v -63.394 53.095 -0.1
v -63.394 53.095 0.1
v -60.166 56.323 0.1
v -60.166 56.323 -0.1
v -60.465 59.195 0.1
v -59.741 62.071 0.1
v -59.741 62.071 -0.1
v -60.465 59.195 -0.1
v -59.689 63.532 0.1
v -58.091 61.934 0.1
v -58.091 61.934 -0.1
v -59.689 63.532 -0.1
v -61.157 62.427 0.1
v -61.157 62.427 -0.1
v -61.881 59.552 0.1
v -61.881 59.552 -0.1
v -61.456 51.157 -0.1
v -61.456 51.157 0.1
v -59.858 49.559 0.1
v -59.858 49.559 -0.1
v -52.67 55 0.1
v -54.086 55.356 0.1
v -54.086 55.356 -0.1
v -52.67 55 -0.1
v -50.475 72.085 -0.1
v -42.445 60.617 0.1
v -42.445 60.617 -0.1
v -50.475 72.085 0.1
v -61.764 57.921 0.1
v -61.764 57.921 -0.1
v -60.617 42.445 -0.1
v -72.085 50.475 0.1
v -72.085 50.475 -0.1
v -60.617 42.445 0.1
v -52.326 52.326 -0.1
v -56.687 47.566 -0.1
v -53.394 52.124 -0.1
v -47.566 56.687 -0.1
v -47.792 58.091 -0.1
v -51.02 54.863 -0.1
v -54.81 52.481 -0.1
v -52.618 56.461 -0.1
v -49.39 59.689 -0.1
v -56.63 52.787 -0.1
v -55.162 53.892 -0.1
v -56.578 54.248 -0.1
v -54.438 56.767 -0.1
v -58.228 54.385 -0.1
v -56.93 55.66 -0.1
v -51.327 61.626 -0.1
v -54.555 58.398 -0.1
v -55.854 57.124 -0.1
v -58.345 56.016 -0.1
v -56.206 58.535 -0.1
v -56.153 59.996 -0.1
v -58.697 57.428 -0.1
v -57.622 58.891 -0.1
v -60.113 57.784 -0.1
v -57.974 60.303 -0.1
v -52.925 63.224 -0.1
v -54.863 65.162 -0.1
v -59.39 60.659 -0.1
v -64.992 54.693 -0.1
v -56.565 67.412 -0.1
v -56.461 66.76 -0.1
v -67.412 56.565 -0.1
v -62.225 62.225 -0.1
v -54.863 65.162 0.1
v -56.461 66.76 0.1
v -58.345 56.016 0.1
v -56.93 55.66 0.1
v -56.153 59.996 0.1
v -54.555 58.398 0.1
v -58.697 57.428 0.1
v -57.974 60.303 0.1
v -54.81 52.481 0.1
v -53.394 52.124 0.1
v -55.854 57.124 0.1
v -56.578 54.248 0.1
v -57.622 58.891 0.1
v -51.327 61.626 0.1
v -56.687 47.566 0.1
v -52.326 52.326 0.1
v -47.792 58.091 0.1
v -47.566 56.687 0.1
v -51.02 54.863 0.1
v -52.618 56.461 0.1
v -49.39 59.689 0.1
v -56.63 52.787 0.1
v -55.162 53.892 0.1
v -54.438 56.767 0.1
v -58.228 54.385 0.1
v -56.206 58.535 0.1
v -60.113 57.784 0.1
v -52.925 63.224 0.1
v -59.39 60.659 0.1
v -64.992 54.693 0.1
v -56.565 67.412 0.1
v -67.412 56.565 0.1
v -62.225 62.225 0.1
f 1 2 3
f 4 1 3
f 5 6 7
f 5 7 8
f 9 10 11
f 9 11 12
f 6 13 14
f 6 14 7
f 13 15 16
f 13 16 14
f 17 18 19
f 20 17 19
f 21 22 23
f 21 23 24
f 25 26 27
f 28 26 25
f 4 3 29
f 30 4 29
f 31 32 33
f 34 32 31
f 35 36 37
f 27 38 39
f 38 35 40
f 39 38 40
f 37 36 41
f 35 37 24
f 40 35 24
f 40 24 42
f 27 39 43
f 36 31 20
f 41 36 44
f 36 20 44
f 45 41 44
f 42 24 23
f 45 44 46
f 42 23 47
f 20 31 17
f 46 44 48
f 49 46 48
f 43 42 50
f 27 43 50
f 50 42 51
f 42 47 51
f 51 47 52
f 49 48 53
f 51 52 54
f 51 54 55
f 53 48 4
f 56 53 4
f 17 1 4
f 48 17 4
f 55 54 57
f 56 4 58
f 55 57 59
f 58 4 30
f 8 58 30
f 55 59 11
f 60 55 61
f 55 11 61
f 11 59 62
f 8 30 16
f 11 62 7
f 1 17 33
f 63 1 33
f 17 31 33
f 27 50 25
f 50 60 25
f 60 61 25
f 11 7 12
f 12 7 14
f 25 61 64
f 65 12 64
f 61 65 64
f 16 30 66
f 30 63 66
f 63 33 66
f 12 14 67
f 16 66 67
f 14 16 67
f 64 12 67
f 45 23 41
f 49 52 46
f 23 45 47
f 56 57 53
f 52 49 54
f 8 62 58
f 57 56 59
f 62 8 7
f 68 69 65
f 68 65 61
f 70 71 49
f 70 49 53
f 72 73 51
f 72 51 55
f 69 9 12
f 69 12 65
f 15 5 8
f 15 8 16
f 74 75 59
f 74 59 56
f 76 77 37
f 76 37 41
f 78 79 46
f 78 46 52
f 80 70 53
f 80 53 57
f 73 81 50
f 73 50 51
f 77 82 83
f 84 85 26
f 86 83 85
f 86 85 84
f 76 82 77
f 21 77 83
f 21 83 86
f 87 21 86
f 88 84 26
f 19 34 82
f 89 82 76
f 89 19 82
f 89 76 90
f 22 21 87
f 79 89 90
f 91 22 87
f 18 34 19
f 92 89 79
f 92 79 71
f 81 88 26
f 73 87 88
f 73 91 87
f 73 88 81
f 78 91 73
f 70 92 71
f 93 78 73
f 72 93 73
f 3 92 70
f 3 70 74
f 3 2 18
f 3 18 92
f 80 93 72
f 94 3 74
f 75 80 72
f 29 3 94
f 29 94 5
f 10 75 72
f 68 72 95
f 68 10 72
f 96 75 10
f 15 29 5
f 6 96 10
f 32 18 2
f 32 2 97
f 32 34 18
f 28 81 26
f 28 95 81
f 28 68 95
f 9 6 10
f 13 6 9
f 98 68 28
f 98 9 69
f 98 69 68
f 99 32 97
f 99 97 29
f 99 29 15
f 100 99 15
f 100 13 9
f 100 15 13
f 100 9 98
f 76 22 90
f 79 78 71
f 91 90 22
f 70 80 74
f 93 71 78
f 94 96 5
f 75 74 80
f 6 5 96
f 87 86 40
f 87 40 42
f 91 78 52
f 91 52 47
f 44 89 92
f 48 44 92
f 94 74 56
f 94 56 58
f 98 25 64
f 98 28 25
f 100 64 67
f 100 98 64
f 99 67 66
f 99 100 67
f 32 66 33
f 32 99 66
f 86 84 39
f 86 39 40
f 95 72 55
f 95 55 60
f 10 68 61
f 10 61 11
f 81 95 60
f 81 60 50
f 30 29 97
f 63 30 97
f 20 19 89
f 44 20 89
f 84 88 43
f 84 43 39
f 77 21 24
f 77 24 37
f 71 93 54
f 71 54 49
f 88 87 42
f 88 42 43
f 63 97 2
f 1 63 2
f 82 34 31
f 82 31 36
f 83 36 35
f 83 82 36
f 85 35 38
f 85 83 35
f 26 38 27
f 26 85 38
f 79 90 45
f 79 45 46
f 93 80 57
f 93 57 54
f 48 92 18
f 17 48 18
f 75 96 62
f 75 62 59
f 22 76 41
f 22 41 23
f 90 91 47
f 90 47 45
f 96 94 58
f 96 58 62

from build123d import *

# Parameters (mm, degrees)
BOSS_EXTRUDE1_DEPTH = 0.1
CUT_EXTRUDE1_DEPTH  = 102.944318085


with BuildPart() as part:
    # Sketch1 → Boss-Extrude1 (new, symmetric)
    with BuildSketch(Plane(origin=(0, 0, 0), x_dir=(0, 1, 0), z_dir=(0, 0, 1))):
        with BuildLine():
            Line((50.474726399, 72.085379897), (42.44465629, 60.617251277))
            ThreePointArc((42.44465629, 60.617251277), (52.325901808, 52.325901808), (60.617251277, 42.44465629))
            Line((60.617251277, 42.44465629), (72.085379897, 50.474726399))
            ThreePointArc((72.085379897, 50.474726399), (62.225396744, 62.225396744), (50.474726399, 72.085379897))
        make_face()
    extrude(amount=BOSS_EXTRUDE1_DEPTH, both=True)

    # Sketch2 → Cut-Extrude1 (cut, through all)
    with BuildSketch(Plane.XY.offset(0.1)):
        Polygon((-54.809835721, 52.480589816), (-54.086251462, 55.355942111), (-52.67039502, 54.999640924), (-53.393979279, 52.124288629), align=None)
        Polygon((-56.577602674, 54.248356769), (-55.854018415, 57.123709064), (-54.438161973, 56.767407877), (-55.161746232, 53.892055582), align=None)
        Polygon((-58.345369627, 56.016123722), (-57.621785368, 58.891476017), (-56.205928926, 58.53517483), (-56.929513185, 55.659822535), align=None)
        Polygon((-60.11313658, 57.783890675), (-59.389552321, 60.65924297), (-57.973695879, 60.302941783), (-58.697280138, 57.427589488), align=None)
        Polygon((-61.880903533, 59.551657628), (-61.157319274, 62.427009923), (-59.741462831, 62.070708736), (-60.465047091, 59.195356441), align=None)
        Polygon((-51.01952203, 54.862647385), (-52.617583355, 56.460708711), (-49.389640899, 59.688651167), (-47.791579573, 58.090589841), align=None)
        Polygon((-59.858356794, 49.559346526), (-56.630414338, 52.787288983), (-58.228475664, 54.385350308), (-61.45641812, 51.157407852), align=None)
        Polygon((-54.555055935, 58.398181291), (-56.153117261, 59.996242617), (-52.925174805, 63.224185073), (-51.327113479, 61.626123747), align=None)
        Polygon((-58.090589841, 61.933715197), (-59.688651167, 63.531776523), (-56.460708711, 66.759718979), (-54.862647385, 65.161657653), align=None)
        Polygon((-63.3938907, 53.094880432), (-60.165948244, 56.322822888), (-61.76400957, 57.920884214), (-64.991952026, 54.692941758), align=None)
    extrude(amount=-CUT_EXTRUDE1_DEPTH, mode=Mode.SUBTRACT)


solid = part.part
